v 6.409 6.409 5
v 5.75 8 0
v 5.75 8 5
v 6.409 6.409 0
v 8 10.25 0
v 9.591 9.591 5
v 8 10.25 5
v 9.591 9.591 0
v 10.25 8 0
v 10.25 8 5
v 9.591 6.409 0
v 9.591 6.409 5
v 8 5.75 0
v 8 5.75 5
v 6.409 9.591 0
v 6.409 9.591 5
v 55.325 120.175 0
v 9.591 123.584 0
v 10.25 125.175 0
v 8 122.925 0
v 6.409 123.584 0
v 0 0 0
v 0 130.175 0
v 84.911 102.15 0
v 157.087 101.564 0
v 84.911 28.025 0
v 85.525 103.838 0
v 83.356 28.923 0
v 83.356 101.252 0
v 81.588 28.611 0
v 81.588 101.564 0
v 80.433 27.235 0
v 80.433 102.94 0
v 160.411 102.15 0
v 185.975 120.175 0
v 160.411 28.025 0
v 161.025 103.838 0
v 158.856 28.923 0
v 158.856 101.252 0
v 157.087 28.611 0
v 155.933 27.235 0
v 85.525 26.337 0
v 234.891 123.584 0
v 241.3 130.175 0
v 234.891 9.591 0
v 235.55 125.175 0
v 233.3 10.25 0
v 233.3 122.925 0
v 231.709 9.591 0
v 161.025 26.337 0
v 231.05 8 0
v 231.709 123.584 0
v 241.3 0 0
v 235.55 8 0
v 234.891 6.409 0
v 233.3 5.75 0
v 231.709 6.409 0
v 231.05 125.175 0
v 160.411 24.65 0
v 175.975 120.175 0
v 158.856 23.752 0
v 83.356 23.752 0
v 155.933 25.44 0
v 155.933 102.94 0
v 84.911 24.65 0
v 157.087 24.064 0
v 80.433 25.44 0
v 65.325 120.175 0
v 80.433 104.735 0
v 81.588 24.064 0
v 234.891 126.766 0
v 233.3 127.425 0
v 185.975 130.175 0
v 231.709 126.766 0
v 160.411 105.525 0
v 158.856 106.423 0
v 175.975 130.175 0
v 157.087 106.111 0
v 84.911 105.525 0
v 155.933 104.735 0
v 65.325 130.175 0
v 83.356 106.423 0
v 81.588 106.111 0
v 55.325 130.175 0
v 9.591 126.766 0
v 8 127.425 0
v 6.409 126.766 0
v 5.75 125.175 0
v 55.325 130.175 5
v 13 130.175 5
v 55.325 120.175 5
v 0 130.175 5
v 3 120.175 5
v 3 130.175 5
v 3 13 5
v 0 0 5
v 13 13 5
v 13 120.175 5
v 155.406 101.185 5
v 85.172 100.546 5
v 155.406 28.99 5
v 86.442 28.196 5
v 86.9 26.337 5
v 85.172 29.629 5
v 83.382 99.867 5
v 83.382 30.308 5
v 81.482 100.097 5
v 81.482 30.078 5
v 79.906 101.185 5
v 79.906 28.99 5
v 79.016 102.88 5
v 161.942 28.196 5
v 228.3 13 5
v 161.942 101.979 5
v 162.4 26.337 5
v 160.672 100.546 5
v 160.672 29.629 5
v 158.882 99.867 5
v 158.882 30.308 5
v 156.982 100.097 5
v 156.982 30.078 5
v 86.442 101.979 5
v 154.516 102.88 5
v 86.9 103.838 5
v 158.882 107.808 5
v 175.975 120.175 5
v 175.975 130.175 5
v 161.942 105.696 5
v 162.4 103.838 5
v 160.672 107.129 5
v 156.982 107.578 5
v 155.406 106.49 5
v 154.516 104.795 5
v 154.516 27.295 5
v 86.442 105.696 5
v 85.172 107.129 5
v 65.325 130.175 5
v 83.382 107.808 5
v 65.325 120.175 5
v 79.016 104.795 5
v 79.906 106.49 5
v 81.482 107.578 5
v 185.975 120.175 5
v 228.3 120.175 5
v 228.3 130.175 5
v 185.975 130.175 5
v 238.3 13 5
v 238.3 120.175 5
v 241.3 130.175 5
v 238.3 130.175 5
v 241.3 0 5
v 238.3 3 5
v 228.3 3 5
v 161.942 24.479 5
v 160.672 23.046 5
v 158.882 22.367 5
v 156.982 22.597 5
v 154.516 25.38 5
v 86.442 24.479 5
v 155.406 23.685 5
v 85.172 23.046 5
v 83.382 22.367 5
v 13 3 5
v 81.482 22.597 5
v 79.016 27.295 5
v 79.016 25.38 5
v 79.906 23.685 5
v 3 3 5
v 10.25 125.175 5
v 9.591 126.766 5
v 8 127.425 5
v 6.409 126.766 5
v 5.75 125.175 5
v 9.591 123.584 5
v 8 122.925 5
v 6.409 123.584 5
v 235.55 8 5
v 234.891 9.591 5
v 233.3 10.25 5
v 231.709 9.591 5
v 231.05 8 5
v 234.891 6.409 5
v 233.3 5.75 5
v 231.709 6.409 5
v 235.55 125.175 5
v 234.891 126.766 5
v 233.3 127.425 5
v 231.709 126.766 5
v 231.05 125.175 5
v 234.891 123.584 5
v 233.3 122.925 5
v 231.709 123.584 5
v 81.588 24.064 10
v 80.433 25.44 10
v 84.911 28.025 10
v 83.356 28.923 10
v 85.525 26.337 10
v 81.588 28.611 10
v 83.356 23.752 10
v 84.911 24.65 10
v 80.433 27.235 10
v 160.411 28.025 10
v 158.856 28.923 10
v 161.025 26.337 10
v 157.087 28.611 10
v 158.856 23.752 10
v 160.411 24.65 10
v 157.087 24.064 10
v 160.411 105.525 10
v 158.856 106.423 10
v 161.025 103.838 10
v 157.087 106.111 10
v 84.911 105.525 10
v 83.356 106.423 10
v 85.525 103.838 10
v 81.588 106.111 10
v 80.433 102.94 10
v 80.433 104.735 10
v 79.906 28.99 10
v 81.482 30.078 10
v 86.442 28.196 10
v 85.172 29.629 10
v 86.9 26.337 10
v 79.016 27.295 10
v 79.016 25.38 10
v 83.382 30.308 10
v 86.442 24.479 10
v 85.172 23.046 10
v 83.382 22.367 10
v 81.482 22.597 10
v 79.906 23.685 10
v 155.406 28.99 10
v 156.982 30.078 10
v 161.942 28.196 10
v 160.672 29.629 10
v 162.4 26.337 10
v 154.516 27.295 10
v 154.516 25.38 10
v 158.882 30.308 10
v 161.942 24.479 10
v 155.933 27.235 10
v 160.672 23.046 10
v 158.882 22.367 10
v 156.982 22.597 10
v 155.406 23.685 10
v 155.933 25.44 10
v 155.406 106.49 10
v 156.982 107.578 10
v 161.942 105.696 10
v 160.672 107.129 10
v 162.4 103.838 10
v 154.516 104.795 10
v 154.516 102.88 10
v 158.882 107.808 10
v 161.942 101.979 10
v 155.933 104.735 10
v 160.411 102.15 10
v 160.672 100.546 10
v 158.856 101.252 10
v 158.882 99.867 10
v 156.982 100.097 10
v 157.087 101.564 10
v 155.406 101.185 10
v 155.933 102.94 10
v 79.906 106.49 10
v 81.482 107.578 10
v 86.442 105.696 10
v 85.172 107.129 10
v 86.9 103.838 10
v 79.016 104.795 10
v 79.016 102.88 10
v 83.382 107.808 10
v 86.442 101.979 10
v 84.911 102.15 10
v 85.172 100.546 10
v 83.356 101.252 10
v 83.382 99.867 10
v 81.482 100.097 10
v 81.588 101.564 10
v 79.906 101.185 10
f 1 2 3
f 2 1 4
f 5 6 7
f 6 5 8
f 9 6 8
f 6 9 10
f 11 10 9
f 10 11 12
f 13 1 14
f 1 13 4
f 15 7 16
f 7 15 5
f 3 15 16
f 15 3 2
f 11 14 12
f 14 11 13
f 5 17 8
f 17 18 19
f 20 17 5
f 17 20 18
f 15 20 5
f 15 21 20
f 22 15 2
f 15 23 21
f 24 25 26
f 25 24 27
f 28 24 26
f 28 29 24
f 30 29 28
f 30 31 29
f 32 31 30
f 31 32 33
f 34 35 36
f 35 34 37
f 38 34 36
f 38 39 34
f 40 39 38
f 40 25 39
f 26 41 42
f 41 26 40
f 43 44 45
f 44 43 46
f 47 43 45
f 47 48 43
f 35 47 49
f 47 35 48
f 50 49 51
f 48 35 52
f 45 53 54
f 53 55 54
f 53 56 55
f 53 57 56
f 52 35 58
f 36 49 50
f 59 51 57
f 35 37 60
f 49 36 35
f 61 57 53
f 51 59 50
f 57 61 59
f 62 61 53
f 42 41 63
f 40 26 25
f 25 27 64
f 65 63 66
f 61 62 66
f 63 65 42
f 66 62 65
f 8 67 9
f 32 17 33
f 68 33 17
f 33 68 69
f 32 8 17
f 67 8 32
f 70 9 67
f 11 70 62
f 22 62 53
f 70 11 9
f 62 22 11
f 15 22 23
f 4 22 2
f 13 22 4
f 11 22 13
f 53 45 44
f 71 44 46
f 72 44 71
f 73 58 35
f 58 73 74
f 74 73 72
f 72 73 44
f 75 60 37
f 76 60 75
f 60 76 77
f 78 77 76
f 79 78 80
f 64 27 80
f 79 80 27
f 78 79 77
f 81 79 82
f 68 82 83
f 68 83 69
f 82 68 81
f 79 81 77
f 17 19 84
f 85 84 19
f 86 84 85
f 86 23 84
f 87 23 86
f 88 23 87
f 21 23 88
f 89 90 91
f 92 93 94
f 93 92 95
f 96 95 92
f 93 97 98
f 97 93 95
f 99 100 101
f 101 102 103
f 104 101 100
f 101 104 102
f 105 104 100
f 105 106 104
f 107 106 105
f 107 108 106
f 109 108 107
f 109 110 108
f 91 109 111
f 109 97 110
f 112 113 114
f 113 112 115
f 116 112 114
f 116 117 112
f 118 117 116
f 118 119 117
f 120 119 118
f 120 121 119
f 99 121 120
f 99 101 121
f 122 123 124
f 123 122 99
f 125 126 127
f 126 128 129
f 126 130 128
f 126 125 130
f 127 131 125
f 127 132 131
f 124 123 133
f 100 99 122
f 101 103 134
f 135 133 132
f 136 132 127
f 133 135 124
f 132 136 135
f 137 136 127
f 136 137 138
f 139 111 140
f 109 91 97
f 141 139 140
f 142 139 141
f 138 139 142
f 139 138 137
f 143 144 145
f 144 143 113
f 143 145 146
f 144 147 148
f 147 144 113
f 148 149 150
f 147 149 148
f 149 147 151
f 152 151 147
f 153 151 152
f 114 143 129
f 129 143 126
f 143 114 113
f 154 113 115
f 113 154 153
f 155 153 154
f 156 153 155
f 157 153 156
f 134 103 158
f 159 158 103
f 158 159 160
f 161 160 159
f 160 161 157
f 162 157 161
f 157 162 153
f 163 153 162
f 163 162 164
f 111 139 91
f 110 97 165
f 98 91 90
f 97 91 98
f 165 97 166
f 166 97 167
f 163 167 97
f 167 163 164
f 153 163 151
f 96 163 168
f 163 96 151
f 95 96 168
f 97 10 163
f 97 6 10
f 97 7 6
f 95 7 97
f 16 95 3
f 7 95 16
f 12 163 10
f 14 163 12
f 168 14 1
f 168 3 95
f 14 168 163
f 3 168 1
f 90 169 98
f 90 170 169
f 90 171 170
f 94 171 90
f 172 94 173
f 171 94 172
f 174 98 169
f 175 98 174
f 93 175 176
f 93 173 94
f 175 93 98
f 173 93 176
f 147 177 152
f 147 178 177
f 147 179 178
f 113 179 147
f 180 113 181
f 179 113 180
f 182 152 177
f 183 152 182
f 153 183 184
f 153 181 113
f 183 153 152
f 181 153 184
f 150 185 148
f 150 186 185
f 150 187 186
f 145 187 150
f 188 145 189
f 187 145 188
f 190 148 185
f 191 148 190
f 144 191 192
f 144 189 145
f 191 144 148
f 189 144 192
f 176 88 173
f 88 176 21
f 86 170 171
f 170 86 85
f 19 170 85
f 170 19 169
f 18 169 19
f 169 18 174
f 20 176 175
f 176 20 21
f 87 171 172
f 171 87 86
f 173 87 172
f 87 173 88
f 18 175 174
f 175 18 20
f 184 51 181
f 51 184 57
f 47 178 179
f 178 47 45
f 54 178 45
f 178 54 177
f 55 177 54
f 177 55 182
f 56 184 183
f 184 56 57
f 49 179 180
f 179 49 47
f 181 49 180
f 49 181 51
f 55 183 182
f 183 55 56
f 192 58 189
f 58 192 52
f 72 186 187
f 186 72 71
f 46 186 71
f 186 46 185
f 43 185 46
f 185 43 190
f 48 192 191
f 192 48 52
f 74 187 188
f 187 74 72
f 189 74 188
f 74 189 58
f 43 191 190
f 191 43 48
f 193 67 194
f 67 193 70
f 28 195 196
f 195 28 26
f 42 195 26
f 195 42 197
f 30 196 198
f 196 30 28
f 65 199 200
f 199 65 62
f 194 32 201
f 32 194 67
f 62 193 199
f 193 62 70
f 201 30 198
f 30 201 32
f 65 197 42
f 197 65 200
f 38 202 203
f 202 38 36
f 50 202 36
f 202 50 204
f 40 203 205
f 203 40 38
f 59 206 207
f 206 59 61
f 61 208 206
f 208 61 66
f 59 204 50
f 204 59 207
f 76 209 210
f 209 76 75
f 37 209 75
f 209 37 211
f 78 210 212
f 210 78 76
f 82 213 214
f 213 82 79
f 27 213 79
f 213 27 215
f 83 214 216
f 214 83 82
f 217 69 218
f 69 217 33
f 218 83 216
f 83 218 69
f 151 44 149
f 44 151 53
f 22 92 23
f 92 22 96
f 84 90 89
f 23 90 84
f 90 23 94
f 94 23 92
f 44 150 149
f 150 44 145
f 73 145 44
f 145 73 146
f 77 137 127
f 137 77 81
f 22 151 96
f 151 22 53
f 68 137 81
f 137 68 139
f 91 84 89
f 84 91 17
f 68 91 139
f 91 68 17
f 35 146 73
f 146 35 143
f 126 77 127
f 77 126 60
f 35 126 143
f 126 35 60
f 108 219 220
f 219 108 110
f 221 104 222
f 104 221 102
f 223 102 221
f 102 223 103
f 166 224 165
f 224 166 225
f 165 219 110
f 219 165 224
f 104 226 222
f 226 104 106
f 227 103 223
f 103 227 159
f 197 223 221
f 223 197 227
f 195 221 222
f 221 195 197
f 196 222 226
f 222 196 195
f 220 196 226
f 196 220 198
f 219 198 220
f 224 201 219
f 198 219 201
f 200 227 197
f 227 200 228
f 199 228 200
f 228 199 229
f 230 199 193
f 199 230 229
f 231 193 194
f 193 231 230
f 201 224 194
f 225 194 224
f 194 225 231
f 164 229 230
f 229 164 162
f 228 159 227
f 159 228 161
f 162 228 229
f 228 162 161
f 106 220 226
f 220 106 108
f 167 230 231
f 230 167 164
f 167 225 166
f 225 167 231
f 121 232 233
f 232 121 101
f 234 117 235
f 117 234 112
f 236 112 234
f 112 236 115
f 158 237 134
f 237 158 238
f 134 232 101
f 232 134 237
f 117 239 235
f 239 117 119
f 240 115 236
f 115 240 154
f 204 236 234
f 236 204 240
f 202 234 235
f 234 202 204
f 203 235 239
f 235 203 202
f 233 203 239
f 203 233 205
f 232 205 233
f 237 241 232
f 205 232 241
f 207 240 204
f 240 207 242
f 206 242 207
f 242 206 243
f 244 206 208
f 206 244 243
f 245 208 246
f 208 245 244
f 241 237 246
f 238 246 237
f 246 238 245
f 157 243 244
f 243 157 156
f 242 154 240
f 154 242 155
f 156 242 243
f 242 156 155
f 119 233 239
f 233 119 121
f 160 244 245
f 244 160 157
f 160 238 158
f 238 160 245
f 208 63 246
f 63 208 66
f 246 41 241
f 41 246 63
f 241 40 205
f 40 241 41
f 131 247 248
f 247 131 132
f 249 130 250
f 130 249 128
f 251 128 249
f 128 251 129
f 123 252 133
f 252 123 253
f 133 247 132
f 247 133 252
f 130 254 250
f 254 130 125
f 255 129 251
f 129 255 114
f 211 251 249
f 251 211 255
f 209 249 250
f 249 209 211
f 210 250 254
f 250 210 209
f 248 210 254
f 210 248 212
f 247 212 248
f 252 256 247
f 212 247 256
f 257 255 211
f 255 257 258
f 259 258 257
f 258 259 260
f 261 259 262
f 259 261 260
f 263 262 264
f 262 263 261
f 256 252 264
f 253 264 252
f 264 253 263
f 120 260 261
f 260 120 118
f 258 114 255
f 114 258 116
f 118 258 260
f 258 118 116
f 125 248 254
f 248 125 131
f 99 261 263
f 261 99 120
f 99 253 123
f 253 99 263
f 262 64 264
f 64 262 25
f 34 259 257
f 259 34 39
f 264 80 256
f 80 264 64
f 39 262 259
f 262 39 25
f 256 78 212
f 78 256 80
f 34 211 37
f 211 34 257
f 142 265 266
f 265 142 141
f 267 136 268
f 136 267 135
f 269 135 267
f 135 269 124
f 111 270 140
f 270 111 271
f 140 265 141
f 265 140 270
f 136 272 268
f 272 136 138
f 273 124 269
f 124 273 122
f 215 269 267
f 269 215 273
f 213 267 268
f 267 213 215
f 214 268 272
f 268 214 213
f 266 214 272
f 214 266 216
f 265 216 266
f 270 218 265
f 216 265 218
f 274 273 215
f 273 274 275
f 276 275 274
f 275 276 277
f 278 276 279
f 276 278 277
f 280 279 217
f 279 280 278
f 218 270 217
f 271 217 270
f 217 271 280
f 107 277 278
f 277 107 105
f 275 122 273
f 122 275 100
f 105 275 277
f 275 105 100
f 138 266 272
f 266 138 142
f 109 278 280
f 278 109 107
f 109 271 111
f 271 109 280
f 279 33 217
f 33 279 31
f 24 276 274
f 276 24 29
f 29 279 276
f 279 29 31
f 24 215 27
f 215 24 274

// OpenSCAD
// file: CircuitHolder.scad
//$fn=500;

$yOffset=77.5;
$xOffset=75.5;

function getCircuitHolderX() = $xOffset;
function getCircuitHolderY() = $yOffset;

module circuitHole()
{
	difference()
	{
		cylinder(d=8,h=10);
		circuitHoleCenter();
	}
}

module circuitHoleCenter()
{
	translate([0,0,-1]) cylinder(d=5.25,h=11);
}

module circuitHolder()
{
	circuitHole();
	translate([$xOffset,0,0]) circuitHole();
	translate([$xOffset,$yOffset,0]) circuitHole();
	translate([0,$yOffset,0]) circuitHole();
}

module circuitHolderHoles()
{
	circuitHoleCenter();
	translate([$xOffset,0,0]) circuitHoleCenter();
	translate([$xOffset,$yOffset,0]) circuitHoleCenter();
	translate([0,$yOffset,0]) circuitHoleCenter();
}

/*difference()
{
	cube([95,95,0.5]);
	translate([5,5,0]) circuitHolderHoles();
}*/
//translate([5,5,0]) circuitHolder();
// file: PowerHoles.scad
$powerHoleX=151;
$powerHoleY=25;

module powerScrewHole()
{
	translate([0,0,-1]) cylinder(d=4.5,h=10);
}

function getPowerHoleX() = $powerHoleX;
function getPowerHoleY() = $powerHoleY;

module powerHoles()
{
	powerScrewHole();
	translate([0,$powerHoleY,0]) powerScrewHole();
	translate([$powerHoleX,0,0]) powerScrewHole();
	translate([$powerHoleX,$powerHoleY,0]) powerScrewHole();
}

powerHoles();
// main file
use <PowerHoles.scad>;
use <CircuitHolder.scad>;

$bottomX=241.3;
$bottomY=260.35;
$bottomZ=5;
$wallThickness=3;
$pillerThickness=10;
$connectorLength=20;
$connectorWidth=10;
$holeSize=3.9;
$wallHeight=116;


function getWallThickness() = $wallThickness;
function getHoleSize() = $holeSize;
function getWallHeight() = $wallHeight;
function getPillerThickness() = $pillerThickness;
function getBottomX() = $bottomX;
function getBottomY() = $bottomY;
function getBottomZ() = $bottomZ;

module boltHole()
{
	union()
	{
		cylinder(d=4.5,h=20);
		translate([0,0,$pillerThickness]) cube([$pillerThickness,$pillerThickness,$pillerThickness], center=true);
	}
}

// Bottom cube
module bottomFront()
{
	union()
	{
		difference()
		{
			cube([$bottomX,$bottomY/2,$bottomZ]);
			translate([($pillerThickness/2)+$wallThickness,($pillerThickness/2)+$wallThickness,0]) boltHole();
			translate([($pillerThickness/2)+$wallThickness,($bottomY/2)-($pillerThickness/2),0]) boltHole();
			translate([$bottomX-(($pillerThickness/2)+$wallThickness),($pillerThickness/2)+$wallThickness,0]) boltHole();
			translate([$bottomX-($pillerThickness/2)-$wallThickness,($bottomY/2)-($pillerThickness/2),0]) boltHole();
			translate([($bottomX/2) + (getPowerHoleX()/2*-1),(($bottomY/2)*0.25)+20,0]) powerHoles();
		}
		translate([($bottomX*0.25)-($connectorWidth/2),($bottomY/2)-($connectorLength/2),0]) cube([$connectorWidth, $connectorLength,$bottomZ]);
		translate([($bottomX*0.75)-($connectorWidth/2),($bottomY/2)-($connectorLength/2),0]) cube([$connectorWidth, $connectorLength,$bottomZ]);
	}
}

module bottomBack()
{
	union()
	{
		difference()
		{
			cube([$bottomX,$bottomY/2,$bottomZ]);
			translate([($pillerThickness/2)+$wallThickness,($pillerThickness/2)+$wallThickness,0]) boltHole();
			translate([($pillerThickness/2)+$wallThickness,($bottomY/2)-($pillerThickness/2),0]) boltHole();
			translate([$bottomX-(($pillerThickness/2)+$wallThickness),($pillerThickness/2)+$wallThickness,0]) boltHole();
			translate([$bottomX-($pillerThickness/2)-$wallThickness,($bottomY/2)-($pillerThickness/2),0]) boltHole();
			translate([($bottomX*0.25)-($connectorWidth/2),($bottomY/2)-($connectorLength/2),0]) cube([$connectorWidth, $connectorLength,$bottomZ]);
			translate([($bottomX*0.75)-($connectorWidth/2),($bottomY/2)-($connectorLength/2),0]) cube([$connectorWidth, $connectorLength,$bottomZ]);
			translate([($bottomX*0.5) + (getCircuitHolderX()/2*-1),($bottomY*0.25) + (getCircuitHolderY()/2*-1),0]) circuitHolderHoles();
		}
		translate([($bottomX*0.5) + (getCircuitHolderX()/2*-1),($bottomY*0.25) + (getCircuitHolderY()/2*-1),0]) circuitHolder();
	}
}


bottomBack();
